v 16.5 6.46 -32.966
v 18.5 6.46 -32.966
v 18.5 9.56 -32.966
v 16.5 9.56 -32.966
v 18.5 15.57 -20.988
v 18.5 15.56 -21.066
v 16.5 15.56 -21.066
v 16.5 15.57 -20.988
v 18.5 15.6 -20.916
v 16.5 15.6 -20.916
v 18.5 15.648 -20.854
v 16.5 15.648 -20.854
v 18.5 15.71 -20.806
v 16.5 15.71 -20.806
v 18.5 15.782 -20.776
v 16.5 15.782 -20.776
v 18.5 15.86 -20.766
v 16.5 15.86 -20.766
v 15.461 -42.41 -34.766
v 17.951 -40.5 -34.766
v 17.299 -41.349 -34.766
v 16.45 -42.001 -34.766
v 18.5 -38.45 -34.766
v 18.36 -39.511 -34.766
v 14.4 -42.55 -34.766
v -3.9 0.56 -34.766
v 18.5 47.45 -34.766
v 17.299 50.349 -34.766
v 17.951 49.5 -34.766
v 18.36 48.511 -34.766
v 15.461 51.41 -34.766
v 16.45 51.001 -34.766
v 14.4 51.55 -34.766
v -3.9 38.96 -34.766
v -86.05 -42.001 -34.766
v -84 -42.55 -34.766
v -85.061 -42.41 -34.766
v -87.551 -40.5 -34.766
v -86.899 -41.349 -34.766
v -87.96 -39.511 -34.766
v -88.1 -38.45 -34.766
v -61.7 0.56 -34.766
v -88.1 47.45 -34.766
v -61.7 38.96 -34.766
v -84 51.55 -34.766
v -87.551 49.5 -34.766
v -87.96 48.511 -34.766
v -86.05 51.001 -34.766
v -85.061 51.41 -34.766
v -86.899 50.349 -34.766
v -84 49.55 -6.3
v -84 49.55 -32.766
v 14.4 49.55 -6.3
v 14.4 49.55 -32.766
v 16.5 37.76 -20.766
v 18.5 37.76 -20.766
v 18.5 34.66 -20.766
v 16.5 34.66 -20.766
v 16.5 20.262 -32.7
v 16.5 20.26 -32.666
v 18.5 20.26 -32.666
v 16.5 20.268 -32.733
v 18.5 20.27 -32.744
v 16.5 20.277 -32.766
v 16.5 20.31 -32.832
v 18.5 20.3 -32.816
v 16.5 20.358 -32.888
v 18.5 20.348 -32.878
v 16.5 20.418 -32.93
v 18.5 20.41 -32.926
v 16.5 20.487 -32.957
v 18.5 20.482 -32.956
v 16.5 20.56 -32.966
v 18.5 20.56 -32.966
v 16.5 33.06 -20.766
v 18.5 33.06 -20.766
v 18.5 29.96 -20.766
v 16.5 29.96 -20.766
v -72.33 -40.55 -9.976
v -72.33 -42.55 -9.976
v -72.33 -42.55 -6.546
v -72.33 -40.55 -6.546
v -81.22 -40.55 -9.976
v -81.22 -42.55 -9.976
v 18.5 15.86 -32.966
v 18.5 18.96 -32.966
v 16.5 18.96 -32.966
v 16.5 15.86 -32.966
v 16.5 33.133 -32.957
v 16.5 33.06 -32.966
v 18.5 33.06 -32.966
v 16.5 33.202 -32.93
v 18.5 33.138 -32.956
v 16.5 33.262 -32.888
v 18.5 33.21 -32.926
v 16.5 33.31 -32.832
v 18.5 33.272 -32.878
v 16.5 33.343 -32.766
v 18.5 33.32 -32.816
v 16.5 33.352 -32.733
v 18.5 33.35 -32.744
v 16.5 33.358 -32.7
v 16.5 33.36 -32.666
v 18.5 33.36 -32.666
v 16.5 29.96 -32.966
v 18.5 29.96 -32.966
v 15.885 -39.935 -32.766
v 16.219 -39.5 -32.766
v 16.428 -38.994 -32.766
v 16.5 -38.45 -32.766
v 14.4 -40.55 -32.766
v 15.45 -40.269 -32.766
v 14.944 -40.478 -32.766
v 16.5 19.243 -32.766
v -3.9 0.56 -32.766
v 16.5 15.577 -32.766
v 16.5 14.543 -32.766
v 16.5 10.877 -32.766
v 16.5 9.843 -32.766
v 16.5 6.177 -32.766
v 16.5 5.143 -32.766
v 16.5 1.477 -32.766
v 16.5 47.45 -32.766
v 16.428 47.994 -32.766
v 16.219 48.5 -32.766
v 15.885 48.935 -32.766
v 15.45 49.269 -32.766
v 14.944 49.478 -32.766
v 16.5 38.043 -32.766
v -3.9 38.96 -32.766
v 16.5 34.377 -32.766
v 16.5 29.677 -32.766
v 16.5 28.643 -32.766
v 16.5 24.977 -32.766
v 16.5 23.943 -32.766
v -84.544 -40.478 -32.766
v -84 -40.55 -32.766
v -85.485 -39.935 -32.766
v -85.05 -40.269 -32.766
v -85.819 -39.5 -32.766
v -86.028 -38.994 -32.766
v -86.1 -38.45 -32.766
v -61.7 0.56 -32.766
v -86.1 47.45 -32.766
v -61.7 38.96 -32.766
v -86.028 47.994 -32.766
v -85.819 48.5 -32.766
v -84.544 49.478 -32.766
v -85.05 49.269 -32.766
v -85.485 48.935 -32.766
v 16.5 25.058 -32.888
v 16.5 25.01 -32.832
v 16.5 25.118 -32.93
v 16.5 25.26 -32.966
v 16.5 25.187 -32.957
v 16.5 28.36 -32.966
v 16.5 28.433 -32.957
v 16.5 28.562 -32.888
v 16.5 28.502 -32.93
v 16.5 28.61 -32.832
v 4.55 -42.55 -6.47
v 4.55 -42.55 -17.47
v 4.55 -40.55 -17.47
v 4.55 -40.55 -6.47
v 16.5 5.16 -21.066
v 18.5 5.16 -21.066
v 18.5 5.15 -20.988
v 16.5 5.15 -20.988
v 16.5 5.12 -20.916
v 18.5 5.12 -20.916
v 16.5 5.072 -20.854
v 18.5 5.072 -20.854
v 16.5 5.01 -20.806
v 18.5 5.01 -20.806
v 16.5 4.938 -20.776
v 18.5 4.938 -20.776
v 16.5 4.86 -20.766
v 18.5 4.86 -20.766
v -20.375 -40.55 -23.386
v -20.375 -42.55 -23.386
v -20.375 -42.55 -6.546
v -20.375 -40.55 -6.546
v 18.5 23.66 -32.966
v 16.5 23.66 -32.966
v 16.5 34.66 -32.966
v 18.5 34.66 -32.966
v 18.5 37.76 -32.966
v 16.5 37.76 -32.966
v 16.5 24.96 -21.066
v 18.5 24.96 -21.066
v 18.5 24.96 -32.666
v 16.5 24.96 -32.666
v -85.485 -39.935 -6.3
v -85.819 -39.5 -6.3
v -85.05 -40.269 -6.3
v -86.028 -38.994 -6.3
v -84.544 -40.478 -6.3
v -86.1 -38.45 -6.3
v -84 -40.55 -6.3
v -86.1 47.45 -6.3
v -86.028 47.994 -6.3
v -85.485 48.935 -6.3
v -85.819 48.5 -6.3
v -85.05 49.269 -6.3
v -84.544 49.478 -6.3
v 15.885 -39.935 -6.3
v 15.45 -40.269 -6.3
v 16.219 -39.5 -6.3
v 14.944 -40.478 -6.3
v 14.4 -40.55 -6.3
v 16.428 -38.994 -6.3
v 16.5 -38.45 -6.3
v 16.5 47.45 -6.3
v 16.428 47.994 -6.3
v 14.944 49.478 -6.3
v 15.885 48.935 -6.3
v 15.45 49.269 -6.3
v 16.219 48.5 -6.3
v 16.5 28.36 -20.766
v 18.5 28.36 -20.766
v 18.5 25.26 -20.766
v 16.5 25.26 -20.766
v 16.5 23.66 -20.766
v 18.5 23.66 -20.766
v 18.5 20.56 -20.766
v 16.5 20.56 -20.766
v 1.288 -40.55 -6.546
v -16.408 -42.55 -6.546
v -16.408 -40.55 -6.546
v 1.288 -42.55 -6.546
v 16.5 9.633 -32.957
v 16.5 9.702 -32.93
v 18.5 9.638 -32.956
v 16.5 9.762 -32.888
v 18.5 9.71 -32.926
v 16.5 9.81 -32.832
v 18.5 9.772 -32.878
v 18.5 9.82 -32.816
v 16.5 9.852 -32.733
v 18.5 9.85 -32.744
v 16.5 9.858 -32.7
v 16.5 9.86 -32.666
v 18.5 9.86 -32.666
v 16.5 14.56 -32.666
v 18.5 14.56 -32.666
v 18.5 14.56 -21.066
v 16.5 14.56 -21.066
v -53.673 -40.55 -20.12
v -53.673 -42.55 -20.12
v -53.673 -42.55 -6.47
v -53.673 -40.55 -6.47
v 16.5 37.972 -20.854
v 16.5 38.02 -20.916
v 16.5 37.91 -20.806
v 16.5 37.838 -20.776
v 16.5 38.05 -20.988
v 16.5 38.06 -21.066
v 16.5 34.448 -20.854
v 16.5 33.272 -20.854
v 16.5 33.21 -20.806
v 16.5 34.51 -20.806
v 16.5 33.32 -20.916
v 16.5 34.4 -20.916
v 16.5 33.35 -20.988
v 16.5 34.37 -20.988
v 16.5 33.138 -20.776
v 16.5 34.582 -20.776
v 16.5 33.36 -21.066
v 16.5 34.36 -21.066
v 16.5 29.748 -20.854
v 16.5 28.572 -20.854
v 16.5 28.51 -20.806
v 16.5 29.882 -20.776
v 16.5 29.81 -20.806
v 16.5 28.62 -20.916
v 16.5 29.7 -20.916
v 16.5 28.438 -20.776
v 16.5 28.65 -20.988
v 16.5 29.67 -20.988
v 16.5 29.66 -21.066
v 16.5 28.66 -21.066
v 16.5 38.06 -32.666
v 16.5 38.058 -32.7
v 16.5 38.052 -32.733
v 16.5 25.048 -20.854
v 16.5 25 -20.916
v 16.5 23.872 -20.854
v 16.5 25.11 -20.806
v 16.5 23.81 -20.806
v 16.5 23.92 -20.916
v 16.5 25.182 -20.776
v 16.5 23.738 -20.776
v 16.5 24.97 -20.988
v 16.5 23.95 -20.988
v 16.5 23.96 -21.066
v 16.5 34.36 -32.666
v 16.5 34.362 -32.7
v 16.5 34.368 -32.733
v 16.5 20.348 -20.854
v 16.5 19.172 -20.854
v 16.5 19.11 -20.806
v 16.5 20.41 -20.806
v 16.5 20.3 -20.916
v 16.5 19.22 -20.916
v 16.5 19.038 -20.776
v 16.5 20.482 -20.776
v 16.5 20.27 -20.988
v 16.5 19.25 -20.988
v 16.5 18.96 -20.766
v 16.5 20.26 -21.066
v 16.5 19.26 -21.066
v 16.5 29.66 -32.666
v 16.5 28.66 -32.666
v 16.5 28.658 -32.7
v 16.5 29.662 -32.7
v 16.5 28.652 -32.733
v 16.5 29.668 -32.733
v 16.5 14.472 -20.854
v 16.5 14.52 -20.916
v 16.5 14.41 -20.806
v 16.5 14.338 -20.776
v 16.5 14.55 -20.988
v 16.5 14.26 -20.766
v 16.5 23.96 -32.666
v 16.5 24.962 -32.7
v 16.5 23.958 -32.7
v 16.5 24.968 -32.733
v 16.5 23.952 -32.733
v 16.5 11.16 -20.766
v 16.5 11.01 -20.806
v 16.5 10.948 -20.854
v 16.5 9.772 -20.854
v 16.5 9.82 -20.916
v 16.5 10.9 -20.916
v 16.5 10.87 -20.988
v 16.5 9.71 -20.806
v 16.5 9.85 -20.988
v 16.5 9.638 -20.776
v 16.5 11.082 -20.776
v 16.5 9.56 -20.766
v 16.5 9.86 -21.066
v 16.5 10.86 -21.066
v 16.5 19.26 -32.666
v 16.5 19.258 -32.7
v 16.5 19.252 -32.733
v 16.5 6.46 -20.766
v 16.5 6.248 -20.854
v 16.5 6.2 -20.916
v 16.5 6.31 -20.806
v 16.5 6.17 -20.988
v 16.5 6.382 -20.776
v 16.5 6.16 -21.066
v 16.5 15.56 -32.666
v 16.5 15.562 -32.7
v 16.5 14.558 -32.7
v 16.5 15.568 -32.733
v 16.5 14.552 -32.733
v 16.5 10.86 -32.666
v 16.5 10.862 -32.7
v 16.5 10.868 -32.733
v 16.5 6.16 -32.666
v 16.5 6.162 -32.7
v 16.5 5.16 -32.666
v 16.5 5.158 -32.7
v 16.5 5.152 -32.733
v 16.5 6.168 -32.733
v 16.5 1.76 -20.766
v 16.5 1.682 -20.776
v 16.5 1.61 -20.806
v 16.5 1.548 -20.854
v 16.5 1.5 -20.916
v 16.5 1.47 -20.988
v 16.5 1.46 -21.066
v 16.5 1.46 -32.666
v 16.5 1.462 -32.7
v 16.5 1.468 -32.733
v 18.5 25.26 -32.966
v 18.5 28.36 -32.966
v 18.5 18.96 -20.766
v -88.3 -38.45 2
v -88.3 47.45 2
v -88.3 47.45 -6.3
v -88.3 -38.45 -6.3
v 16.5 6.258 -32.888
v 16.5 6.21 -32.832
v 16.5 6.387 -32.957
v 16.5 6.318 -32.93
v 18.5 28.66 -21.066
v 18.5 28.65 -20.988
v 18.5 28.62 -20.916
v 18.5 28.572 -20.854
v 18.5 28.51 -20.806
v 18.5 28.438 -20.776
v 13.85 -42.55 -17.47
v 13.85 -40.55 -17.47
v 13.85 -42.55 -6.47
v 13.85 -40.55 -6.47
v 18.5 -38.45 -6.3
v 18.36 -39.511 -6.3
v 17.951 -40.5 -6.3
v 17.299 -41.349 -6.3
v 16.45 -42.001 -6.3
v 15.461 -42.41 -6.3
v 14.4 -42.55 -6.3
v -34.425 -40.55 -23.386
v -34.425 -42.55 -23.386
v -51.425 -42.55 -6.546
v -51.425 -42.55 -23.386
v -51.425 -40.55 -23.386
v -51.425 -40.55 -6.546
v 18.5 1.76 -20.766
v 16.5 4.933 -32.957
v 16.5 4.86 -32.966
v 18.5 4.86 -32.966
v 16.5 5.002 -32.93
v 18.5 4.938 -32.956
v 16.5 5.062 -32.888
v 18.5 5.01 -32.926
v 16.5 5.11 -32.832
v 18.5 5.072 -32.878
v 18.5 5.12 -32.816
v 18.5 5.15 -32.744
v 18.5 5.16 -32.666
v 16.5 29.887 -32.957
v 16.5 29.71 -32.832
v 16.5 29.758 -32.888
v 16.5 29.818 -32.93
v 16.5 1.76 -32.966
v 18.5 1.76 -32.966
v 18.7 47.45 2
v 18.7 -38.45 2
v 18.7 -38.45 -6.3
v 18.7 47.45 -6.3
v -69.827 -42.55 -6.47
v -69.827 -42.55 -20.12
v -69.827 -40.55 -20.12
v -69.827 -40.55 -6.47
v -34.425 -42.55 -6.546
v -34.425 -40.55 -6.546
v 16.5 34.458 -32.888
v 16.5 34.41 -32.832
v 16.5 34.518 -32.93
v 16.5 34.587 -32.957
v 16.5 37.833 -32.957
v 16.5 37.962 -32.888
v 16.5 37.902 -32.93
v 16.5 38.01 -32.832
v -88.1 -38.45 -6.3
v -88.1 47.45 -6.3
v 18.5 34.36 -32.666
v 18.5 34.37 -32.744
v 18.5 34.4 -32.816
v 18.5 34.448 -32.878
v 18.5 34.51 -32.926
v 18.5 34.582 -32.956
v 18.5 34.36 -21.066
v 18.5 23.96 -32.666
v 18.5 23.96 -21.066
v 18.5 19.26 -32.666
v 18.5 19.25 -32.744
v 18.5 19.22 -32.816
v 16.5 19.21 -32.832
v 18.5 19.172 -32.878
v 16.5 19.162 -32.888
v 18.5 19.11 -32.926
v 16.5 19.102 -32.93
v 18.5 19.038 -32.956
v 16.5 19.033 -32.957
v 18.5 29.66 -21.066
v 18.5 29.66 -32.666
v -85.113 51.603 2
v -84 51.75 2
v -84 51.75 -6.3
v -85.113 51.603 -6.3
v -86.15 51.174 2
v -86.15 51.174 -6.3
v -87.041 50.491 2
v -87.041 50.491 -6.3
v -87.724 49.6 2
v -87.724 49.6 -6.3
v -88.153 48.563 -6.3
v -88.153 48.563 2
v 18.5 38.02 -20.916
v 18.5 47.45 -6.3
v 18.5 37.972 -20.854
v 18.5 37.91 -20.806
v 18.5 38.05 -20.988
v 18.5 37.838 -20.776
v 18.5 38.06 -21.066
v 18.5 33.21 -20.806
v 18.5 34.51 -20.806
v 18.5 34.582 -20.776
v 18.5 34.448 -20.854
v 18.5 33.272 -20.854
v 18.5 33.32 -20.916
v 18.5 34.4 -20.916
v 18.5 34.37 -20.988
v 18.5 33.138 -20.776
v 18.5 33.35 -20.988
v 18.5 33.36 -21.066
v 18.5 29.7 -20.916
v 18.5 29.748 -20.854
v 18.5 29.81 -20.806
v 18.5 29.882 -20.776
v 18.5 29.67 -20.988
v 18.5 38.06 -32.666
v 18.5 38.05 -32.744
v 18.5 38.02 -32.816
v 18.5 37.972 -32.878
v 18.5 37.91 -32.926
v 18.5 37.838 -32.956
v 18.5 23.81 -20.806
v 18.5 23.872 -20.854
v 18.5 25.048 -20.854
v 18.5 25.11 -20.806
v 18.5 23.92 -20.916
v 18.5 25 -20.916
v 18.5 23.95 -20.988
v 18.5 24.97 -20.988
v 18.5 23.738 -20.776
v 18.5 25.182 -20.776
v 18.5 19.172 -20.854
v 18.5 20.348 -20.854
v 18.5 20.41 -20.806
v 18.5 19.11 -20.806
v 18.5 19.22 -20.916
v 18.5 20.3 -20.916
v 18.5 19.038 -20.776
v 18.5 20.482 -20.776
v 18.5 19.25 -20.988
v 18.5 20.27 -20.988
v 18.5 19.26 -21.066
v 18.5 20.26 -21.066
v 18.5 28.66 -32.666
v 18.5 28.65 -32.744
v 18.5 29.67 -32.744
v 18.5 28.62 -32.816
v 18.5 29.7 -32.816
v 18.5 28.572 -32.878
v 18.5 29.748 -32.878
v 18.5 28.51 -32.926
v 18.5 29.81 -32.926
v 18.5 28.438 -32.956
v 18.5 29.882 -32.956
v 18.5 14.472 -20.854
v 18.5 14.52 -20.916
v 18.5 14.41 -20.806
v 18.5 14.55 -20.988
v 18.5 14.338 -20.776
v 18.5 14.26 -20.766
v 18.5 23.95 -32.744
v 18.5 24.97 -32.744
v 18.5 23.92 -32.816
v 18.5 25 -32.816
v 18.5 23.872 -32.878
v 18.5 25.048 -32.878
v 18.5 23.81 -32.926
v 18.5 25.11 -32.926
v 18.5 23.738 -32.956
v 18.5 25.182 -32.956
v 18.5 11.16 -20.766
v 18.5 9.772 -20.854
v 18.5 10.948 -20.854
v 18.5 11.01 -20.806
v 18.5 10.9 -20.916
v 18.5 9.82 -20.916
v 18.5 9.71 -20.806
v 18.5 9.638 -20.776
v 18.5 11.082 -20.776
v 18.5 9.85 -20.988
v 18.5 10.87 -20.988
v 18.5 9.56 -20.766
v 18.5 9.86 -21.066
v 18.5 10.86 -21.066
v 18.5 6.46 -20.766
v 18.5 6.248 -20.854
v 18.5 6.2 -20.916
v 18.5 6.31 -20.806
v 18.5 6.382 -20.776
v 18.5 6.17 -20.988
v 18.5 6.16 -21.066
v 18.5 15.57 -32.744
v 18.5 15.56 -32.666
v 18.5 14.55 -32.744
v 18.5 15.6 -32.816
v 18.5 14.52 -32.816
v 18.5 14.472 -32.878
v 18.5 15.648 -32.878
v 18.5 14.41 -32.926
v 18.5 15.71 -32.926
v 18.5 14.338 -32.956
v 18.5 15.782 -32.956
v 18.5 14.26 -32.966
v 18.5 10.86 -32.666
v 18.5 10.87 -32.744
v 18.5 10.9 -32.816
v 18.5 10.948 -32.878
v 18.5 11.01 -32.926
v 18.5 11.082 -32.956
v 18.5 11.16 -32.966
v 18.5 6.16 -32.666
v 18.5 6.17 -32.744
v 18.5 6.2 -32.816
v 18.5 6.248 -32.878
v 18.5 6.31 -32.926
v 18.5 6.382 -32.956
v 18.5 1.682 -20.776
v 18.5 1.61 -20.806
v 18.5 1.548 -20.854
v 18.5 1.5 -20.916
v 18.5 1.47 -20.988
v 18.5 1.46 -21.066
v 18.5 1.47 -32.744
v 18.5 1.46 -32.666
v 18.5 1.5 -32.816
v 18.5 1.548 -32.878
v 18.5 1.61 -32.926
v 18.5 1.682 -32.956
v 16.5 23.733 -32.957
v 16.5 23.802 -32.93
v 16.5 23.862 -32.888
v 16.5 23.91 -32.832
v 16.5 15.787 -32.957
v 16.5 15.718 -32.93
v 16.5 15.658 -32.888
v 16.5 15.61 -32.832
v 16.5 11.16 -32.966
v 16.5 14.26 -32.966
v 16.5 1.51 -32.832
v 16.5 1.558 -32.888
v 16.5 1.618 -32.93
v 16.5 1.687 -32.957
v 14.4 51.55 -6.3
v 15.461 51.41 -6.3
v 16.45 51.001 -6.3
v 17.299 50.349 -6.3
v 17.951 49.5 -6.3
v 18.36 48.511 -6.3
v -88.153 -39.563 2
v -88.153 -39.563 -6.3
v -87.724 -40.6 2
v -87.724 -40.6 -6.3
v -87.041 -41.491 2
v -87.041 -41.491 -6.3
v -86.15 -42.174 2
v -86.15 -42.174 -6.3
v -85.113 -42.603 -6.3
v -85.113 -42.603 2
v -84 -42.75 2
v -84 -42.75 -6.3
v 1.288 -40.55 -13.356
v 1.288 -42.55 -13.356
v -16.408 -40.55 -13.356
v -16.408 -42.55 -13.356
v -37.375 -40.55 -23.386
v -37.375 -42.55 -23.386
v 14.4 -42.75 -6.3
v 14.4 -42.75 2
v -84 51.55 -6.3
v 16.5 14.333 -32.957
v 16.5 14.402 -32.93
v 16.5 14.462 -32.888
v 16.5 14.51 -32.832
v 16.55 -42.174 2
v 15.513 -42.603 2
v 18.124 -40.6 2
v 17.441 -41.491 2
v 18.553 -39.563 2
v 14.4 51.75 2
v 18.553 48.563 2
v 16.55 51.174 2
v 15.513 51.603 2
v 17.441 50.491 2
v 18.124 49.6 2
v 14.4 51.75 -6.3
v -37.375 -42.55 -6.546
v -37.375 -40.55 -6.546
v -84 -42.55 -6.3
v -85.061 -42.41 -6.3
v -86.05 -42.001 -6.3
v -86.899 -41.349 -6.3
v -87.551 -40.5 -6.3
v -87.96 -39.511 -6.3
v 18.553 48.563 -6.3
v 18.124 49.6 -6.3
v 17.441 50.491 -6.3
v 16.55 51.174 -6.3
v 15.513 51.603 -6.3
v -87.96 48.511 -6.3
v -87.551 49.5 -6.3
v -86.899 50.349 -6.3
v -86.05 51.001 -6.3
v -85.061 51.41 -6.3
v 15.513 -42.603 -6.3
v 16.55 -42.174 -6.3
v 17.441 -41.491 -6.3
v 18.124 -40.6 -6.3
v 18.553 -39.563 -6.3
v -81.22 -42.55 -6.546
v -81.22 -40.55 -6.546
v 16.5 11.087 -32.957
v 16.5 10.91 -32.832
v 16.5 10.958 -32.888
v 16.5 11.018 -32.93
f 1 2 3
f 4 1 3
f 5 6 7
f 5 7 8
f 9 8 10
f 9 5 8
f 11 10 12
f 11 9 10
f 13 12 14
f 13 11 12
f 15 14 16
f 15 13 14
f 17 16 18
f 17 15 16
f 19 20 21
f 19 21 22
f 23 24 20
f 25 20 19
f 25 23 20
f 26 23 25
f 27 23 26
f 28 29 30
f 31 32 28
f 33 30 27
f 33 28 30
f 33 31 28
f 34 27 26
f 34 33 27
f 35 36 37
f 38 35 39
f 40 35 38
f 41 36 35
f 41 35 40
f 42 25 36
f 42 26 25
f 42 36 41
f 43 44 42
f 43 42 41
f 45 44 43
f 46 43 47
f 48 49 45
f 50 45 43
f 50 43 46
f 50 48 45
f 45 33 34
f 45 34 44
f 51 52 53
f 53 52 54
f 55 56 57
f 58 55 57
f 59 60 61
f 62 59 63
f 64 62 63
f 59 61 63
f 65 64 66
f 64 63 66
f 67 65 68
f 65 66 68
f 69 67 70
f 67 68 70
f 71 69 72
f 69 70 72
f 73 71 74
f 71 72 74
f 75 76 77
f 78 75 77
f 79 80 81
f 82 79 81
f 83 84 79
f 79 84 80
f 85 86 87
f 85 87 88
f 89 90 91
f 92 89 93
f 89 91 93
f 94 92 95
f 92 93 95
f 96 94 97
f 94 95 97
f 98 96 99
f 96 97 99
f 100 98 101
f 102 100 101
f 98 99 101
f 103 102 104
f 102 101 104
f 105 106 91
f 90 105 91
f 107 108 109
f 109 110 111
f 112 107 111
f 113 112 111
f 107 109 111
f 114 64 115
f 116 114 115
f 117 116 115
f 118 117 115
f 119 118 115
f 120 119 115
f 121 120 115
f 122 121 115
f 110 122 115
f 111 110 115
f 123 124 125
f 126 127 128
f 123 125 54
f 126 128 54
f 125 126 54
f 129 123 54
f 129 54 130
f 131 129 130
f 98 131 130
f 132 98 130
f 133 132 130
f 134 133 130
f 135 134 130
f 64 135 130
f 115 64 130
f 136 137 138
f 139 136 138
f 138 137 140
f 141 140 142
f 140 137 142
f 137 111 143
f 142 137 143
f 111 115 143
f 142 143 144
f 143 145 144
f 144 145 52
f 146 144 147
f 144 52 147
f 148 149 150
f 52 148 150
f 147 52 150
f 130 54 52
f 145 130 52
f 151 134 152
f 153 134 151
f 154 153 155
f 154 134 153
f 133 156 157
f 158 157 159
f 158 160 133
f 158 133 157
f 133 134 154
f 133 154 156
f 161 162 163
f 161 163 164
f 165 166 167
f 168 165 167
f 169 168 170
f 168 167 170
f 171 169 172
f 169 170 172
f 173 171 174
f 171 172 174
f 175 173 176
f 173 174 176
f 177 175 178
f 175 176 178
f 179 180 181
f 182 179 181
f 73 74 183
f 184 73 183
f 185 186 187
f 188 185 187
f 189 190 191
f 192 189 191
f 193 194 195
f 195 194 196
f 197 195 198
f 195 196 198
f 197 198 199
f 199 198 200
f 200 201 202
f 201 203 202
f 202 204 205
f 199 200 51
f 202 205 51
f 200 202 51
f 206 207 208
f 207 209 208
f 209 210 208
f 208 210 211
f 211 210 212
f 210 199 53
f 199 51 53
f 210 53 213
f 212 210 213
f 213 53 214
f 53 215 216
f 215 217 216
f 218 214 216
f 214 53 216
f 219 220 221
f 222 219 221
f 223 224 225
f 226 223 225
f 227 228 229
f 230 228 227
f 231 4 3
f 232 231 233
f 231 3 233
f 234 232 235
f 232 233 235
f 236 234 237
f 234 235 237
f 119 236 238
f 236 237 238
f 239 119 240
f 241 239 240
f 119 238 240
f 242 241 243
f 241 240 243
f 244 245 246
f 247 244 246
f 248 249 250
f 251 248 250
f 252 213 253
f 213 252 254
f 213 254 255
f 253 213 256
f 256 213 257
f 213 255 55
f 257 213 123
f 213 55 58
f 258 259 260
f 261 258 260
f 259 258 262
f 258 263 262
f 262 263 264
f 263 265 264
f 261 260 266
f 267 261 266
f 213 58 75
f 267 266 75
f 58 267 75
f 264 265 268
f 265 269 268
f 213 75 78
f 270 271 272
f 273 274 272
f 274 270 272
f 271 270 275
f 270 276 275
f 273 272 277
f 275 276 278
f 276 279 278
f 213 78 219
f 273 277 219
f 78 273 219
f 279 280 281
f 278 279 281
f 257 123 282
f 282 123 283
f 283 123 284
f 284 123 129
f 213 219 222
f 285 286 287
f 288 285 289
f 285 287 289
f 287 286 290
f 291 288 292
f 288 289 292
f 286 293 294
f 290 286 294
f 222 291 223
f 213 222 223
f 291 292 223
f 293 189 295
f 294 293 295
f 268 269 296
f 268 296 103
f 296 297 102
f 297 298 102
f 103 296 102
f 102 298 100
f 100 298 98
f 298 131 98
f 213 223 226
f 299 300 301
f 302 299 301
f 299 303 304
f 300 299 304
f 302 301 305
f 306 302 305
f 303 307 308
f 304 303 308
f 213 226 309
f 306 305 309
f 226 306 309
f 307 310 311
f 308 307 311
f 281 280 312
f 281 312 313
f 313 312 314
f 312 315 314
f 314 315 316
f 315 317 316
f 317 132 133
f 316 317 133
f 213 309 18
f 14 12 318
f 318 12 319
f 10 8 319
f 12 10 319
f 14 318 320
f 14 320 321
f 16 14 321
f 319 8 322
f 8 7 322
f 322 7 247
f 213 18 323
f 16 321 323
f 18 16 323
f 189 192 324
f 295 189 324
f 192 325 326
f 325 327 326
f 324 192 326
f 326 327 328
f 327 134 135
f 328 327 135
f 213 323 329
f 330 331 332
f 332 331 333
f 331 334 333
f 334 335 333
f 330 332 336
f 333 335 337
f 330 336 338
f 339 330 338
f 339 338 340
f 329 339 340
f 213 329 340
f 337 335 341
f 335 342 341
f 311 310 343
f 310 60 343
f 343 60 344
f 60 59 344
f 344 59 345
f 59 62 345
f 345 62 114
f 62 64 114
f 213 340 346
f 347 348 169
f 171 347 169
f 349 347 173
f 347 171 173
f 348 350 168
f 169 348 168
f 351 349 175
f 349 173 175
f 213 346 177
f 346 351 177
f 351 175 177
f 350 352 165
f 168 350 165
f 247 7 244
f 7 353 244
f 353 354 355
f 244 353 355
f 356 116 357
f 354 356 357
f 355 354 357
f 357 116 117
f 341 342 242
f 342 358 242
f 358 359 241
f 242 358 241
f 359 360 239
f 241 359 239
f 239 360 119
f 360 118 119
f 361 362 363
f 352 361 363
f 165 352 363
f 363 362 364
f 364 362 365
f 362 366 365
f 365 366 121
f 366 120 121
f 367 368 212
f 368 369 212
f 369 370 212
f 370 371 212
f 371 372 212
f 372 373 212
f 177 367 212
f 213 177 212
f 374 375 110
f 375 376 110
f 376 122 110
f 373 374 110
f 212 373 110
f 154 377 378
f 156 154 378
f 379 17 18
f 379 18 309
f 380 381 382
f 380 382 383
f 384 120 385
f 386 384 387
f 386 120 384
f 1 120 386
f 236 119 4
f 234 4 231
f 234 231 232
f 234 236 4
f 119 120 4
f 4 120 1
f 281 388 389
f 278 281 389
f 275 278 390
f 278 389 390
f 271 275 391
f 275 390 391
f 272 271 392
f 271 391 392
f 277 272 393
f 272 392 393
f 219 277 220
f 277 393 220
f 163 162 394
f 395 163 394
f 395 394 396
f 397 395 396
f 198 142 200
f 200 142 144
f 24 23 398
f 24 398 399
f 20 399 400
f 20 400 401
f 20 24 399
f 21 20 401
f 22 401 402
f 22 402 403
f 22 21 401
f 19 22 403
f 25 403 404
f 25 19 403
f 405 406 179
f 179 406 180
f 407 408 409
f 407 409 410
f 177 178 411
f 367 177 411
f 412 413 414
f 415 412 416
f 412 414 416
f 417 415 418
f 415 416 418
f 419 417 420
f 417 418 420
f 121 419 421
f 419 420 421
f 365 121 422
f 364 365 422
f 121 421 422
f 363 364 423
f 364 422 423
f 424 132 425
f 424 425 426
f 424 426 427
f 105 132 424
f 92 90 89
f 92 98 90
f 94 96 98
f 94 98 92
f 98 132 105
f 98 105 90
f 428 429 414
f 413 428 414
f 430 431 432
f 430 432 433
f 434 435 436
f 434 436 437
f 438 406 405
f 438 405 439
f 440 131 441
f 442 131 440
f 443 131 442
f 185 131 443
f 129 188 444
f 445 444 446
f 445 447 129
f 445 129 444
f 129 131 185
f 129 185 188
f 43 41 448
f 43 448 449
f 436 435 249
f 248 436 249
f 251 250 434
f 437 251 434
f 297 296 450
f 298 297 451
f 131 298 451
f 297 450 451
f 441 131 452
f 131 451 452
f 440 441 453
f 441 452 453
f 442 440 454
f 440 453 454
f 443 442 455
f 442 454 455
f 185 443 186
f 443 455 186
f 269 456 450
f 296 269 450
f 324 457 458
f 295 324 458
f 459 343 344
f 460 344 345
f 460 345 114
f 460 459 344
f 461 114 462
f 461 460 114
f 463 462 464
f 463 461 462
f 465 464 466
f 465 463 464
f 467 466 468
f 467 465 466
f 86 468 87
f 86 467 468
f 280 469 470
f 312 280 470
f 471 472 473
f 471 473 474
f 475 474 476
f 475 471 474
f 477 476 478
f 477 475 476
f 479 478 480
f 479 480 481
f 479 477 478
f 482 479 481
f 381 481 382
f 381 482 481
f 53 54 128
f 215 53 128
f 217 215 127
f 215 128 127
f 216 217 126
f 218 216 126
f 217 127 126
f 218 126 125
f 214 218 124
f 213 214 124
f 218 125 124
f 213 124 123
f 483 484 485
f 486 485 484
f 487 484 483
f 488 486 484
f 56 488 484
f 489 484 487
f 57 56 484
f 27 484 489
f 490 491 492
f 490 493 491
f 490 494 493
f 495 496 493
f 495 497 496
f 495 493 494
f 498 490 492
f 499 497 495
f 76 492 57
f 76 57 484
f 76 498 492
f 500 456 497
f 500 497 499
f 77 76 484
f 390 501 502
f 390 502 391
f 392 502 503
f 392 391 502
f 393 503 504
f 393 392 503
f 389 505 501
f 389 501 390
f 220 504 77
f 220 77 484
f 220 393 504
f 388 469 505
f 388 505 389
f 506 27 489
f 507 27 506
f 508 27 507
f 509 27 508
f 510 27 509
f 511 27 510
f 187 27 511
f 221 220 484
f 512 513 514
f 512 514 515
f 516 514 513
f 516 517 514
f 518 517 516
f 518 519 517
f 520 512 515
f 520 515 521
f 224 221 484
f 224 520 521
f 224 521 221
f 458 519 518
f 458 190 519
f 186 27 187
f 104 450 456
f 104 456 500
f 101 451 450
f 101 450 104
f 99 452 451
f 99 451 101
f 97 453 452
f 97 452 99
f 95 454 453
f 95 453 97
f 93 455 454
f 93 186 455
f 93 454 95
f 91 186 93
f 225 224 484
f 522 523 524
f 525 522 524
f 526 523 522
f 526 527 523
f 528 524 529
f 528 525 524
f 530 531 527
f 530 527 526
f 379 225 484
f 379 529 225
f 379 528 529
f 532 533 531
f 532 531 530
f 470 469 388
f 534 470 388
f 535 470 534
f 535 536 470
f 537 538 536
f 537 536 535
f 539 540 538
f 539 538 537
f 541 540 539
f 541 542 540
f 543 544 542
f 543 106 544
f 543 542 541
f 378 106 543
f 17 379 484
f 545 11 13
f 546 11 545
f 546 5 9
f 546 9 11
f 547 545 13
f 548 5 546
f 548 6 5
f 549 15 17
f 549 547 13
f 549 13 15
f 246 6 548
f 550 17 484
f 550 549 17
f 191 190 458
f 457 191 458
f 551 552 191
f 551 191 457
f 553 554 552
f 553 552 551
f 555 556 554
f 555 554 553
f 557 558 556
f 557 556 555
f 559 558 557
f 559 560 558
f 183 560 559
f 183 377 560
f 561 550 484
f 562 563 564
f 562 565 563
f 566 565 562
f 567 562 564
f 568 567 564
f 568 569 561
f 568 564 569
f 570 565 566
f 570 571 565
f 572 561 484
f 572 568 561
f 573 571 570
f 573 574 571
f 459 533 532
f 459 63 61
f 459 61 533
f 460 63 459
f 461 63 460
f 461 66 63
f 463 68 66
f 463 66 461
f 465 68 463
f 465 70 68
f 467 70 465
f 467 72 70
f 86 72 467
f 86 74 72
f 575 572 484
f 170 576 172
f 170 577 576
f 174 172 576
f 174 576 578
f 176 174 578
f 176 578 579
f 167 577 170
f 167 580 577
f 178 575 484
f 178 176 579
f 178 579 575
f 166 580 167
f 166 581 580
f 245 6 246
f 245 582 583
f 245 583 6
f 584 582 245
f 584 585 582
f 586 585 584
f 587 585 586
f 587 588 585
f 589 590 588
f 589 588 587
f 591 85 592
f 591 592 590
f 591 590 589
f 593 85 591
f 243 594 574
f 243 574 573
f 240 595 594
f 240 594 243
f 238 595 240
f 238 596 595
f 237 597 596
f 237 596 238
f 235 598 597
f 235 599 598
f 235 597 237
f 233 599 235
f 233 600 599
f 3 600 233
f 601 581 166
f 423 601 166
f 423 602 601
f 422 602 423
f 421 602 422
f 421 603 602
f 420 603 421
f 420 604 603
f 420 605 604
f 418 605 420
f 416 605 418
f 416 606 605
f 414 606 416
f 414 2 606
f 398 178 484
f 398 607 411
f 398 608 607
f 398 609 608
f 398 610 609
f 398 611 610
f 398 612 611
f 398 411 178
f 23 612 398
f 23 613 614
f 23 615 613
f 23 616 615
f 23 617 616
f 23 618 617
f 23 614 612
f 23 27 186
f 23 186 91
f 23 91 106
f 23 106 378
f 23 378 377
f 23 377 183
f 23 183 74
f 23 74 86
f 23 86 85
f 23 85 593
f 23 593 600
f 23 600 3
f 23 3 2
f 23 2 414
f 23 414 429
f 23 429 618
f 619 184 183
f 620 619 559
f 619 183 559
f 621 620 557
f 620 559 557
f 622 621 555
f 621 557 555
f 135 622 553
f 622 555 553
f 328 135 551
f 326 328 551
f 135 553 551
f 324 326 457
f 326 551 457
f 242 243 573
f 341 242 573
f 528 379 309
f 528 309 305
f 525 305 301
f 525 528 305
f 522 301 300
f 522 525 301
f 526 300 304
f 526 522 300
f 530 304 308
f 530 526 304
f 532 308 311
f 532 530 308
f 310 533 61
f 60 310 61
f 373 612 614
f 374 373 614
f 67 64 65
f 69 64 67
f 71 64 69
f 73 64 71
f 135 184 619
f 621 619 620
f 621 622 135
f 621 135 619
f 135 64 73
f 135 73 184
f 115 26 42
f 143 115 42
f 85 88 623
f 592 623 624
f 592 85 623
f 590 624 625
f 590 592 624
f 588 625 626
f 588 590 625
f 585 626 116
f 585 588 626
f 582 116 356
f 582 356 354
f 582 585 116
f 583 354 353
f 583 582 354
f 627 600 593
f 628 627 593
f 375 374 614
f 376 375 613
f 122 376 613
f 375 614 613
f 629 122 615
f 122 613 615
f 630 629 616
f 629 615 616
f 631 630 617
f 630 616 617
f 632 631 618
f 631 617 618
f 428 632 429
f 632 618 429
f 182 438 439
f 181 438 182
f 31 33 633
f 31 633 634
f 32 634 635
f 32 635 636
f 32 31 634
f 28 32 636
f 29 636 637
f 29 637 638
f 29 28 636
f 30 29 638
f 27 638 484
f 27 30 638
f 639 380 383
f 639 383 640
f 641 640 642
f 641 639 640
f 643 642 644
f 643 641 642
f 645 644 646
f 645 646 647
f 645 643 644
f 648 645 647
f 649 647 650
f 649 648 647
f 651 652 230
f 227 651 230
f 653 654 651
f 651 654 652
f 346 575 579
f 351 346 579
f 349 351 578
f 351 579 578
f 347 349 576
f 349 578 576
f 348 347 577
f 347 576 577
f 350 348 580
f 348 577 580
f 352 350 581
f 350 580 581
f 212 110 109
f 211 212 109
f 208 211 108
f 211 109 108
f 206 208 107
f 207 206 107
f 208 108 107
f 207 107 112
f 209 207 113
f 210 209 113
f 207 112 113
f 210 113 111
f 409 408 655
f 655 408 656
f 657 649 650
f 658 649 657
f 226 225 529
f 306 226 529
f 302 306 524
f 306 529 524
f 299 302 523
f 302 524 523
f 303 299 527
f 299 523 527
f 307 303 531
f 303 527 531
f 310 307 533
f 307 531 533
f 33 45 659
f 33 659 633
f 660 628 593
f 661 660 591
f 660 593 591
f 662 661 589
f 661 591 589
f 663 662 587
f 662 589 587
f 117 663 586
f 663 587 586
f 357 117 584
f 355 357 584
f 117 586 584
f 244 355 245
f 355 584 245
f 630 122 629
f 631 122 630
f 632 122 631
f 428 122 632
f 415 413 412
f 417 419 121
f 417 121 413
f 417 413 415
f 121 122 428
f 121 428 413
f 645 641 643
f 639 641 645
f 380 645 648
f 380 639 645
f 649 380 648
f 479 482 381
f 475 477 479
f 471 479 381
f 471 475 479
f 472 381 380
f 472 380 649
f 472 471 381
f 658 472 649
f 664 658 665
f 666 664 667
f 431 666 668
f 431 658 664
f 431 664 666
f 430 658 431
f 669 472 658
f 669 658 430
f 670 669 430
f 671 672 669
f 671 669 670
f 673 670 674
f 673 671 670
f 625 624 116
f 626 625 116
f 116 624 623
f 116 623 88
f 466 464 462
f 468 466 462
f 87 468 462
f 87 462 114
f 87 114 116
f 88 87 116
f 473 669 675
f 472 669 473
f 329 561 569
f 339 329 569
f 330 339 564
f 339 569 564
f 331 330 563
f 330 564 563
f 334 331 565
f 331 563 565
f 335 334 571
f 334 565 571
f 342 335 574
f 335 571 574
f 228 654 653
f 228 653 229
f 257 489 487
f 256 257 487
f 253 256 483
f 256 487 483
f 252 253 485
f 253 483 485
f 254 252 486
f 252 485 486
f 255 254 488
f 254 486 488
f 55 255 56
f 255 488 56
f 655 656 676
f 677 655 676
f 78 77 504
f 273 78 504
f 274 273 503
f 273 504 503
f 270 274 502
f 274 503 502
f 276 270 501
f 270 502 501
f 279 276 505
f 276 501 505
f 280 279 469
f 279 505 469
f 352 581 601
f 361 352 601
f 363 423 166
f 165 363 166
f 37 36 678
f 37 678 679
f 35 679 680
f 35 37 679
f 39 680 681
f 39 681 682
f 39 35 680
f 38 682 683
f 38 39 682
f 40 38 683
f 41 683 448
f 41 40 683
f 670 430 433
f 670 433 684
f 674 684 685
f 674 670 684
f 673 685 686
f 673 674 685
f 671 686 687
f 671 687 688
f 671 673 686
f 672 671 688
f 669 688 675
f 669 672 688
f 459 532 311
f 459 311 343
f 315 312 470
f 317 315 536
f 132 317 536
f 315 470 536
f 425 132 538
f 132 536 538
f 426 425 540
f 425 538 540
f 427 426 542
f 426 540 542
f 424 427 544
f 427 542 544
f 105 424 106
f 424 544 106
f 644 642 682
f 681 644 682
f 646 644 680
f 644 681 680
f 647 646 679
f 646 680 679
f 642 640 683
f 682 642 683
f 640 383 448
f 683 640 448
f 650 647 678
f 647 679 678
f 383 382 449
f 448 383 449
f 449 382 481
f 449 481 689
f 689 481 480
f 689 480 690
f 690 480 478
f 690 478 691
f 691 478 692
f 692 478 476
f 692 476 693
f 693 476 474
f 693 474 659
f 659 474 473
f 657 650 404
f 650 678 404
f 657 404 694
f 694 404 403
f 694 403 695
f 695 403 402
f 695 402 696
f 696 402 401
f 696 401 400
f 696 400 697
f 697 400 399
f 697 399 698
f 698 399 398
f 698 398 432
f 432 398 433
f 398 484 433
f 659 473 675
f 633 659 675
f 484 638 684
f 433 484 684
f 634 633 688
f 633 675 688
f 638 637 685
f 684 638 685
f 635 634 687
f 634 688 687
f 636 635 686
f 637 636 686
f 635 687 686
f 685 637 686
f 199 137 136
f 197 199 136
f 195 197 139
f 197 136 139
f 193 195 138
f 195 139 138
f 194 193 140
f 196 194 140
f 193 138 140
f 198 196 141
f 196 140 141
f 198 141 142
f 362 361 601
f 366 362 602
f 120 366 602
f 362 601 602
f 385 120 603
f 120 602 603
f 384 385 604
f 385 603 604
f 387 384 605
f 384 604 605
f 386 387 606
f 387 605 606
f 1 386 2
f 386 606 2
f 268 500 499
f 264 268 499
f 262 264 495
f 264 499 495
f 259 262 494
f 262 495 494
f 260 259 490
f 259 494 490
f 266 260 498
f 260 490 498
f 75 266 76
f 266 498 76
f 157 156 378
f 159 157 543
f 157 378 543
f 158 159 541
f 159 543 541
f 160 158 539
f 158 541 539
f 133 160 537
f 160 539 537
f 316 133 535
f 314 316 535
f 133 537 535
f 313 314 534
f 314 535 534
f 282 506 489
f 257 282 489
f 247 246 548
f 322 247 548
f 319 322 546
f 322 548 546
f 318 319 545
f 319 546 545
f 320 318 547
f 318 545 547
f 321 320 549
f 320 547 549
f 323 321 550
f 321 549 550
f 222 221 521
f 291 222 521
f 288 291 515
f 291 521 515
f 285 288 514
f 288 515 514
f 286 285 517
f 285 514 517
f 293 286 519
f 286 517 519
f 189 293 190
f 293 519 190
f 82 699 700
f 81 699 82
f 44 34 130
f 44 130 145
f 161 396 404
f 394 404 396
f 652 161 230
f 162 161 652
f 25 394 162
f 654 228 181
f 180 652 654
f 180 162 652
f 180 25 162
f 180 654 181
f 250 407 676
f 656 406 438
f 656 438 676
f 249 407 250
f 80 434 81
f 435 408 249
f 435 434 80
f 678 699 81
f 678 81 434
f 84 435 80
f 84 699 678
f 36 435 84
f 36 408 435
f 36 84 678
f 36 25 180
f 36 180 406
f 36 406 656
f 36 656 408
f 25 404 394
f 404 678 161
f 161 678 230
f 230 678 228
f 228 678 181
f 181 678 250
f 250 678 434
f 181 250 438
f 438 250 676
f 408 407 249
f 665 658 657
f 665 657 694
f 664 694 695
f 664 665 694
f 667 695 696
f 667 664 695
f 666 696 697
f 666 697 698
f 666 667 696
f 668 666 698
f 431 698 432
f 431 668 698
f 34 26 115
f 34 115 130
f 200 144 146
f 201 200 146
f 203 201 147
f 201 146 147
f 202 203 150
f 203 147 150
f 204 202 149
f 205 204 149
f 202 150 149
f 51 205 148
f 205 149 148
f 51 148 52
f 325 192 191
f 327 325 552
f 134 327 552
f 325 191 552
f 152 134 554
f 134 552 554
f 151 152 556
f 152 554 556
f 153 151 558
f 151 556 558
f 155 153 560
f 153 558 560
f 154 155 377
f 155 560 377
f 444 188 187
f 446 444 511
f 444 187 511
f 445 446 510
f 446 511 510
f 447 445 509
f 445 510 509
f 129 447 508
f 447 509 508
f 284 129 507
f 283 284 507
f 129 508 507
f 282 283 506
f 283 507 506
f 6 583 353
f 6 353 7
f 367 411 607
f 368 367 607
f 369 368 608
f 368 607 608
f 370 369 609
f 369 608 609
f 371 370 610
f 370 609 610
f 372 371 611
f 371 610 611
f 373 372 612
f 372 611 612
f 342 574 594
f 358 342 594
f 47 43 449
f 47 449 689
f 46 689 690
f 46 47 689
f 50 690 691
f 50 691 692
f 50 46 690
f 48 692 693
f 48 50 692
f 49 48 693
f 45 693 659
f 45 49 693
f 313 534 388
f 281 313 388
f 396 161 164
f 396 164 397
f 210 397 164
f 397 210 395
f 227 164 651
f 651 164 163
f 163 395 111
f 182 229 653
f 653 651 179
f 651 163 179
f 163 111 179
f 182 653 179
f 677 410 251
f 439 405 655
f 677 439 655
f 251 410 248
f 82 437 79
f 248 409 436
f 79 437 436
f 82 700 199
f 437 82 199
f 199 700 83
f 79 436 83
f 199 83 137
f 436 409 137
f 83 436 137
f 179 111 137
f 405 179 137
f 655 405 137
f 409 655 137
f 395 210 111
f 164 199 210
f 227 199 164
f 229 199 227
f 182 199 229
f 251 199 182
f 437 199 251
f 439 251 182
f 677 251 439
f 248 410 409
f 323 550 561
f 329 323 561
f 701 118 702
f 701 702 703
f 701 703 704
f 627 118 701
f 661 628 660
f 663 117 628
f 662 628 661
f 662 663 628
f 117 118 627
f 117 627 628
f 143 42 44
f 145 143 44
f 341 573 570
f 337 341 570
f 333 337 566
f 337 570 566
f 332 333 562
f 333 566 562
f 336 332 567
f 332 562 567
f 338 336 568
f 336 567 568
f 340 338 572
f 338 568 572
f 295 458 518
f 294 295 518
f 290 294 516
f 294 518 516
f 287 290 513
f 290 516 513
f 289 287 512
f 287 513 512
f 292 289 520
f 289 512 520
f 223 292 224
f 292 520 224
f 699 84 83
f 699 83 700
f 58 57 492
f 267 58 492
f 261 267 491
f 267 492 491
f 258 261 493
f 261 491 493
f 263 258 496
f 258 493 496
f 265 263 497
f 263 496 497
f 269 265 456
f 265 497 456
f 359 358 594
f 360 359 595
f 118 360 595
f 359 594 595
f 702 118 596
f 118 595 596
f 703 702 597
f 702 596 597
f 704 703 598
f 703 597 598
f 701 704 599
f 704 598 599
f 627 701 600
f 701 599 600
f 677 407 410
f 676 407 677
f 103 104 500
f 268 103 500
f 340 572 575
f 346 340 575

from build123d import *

# Parameters (mm, degrees)
BOSS_EXTRUDE1_DEPTH = 2
BOSS_EXTRUDE2_DEPTH = 8.3
SKETCH3_W           = 57.8
SKETCH3_H           = 38.4
BOSS_EXTRUDE3_DEPTH = 2
BOSS_EXTRUDE6_DEPTH = 30
SKETCH5_W           = 9.3
SKETCH5_H           = 11
SKETCH5_W_2         = 17.696
SKETCH5_H_2         = 6.81
SKETCH5_W_3         = 14.05
SKETCH5_H_3         = 16.84
SKETCH5_W_4         = 8.89
SKETCH5_H_4         = 3.43
SKETCH5_W_5         = 8.74
SKETCH5_H_5         = 13.649992795
SKETCH5_W_6         = 2
SKETCH5_W_7         = 1.707
CUT_EXTRUDE1_DEPTH  = 2
CUT_EXTRUDE2_DEPTH  = 2
CUT_EXTRUDE3_DEPTH  = 2
CUT_EXTRUDE4_DEPTH  = 2


with BuildPart() as part:
    # Sketch1 → Boss-Extrude1 (new body)
    with BuildSketch(Plane.XY):
        with BuildLine():
            Line((-86.3, 47.45), (-86.3, -38.45))
            ThreePointArc((-86.3, -38.45), (-85.626345597, -40.076345597), (-84, -40.75))
            Line((-84, -40.75), (14.4, -40.75))
            ThreePointArc((14.4, -40.75), (16.026345597, -40.076345597), (16.7, -38.45))
            Line((16.7, -38.45), (16.7, 47.45))
            ThreePointArc((16.7, 47.45), (16.026345597, 49.076345597), (14.4, 49.75))
            Line((14.4, 49.75), (-84, 49.75))
            ThreePointArc((-84, 49.75), (-85.626345597, 49.076345597), (-86.3, 47.45))
        make_face()
    extrude(amount=BOSS_EXTRUDE1_DEPTH)

    # Sketch2 → Boss-Extrude2 (add)
    with BuildSketch(Plane.XY.offset(2)):
        with BuildLine():
            Line((-88.3, 47.45), (-88.3, -38.45))
            ThreePointArc((-88.3, -38.45), (-87.040559159, -41.490559159), (-84, -42.75))
            Line((-84, -42.75), (14.4, -42.75))
            ThreePointArc((14.4, -42.75), (17.440559159, -41.490559159), (18.7, -38.45))
            Line((18.7, -38.45), (18.7, 47.45))
            ThreePointArc((18.7, 47.45), (17.440559159, 50.490559159), (14.4, 51.75))
            Line((14.4, 51.75), (-84, 51.75))
            ThreePointArc((-84, 51.75), (-87.040559159, 50.490559159), (-88.3, 47.45))
        make_face()
    extrude(amount=-BOSS_EXTRUDE2_DEPTH)



with BuildPart() as body_2:
    # Sketch3 → Boss-Extrude3 (new body)
    with BuildSketch(Plane(origin=(0, 0, -34.766), x_dir=(-1, 0, 0), z_dir=(0, 0, -1))):
        with BuildLine():
            Line((-14.4, -40.55), (84, -40.55))
            ThreePointArc((84, -40.55), (85.48492424, -39.93492424), (86.1, -38.45))
            Line((86.1, -38.45), (86.1, 47.45))
            ThreePointArc((86.1, 47.45), (85.48492424, 48.93492424), (84, 49.55))
            Line((84, 49.55), (-14.4, 49.55))
            ThreePointArc((-14.4, 49.55), (-15.88492424, 48.93492424), (-16.5, 47.45))
            Line((-16.5, 47.45), (-16.5, -38.45))
            ThreePointArc((-16.5, -38.45), (-15.88492424, -39.93492424), (-14.4, -40.55))
        make_face()
        with Locations((32.8, 19.76)):
            Rectangle(SKETCH3_W, SKETCH3_H, mode=Mode.SUBTRACT)
    extrude(amount=-BOSS_EXTRUDE3_DEPTH)


with BuildPart() as part_1:
    add(part.part)

    add(body_2.part)  # Boss-Extrude6 merges body 2
    # Sketch4 → Boss-Extrude6 (add)
    with BuildSketch(Plane(origin=(0, 0, -34.766), x_dir=(-1, 0, 0), z_dir=(0, 0, -1))):
        with BuildLine():
            Line((84, 51.55), (-14.4, 51.55))
            ThreePointArc((-14.4, 51.55), (-17.299137803, 50.349137803), (-18.5, 47.45))
            Line((-18.5, 47.45), (-18.5, -38.45))
            ThreePointArc((-18.5, -38.45), (-17.299137803, -41.349137803), (-14.4, -42.55))
            Line((-14.4, -42.55), (84, -42.55))
            ThreePointArc((84, -42.55), (86.899137803, -41.349137803), (88.1, -38.45))
            Line((88.1, -38.45), (88.1, 47.45))
            ThreePointArc((88.1, 47.45), (86.899137803, 50.349137803), (84, 51.55))
        make_face()
        with BuildLine():
            ThreePointArc((-16.5, -38.45), (-15.88492424, -39.93492424), (-14.4, -40.55))
            Line((-14.4, -40.55), (84, -40.55))
            ThreePointArc((84, -40.55), (85.48492424, -39.93492424), (86.1, -38.45))
            Line((86.1, -38.45), (86.1, 47.45))
            ThreePointArc((86.1, 47.45), (85.48492424, 48.93492424), (84, 49.55))
            Line((84, 49.55), (-14.4, 49.55))
            ThreePointArc((-14.4, 49.55), (-15.88492424, 48.93492424), (-16.5, 47.45))
            Line((-16.5, 47.45), (-16.5, -38.45))
        make_face(mode=Mode.SUBTRACT)
    extrude(amount=-BOSS_EXTRUDE6_DEPTH)

    # Sketch5 → Cut-Extrude1 (cut)
    with BuildSketch(Plane.XZ.offset(42.55)):
        with Locations((9.2, -11.97)):
            Rectangle(SKETCH5_W, SKETCH5_H)
        with Locations((-7.56, -9.9512)):
            Rectangle(SKETCH5_W_2, SKETCH5_H_2)
        with Locations((-27.4, -14.9662)):
            Rectangle(SKETCH5_W_3, SKETCH5_H_3)
        with Locations((-44.4, -14.9662)):
            Rectangle(SKETCH5_W_3, SKETCH5_H_3)
        with Locations((-76.775, -8.2612)):
            Rectangle(SKETCH5_W_4, SKETCH5_H_4)
        with Locations((-61.75, -13.294996398)):
            Rectangle(SKETCH5_W_5, SKETCH5_H_5)
        with Locations((-56.38, -13.294996398)):
            Rectangle(SKETCH5_W_6, SKETCH5_H_5)
        with Locations((-67.12, -13.294996398)):
            Rectangle(SKETCH5_W_6, SKETCH5_H_5)
        with Locations((-54.5265, -13.294996398)):
            Rectangle(SKETCH5_W_7, SKETCH5_H_5)
        with Locations((-68.9735, -13.294996398)):
            Rectangle(SKETCH5_W_7, SKETCH5_H_5)
    extrude(amount=-CUT_EXTRUDE1_DEPTH, mode=Mode.SUBTRACT)

    # Sketch6 → Cut-Extrude2 (cut)
    with BuildSketch(Plane(origin=(18.5, 0, 0), x_dir=(0, 0, -1), z_dir=(1, 0, 0))):
        with BuildLine():
            Line((32.966, 1.76), (32.966, 4.86))
            ThreePointArc((32.966, 4.86), (32.878132034, 5.072132034), (32.666, 5.16))
            Line((32.666, 5.16), (21.066, 5.16))
            ThreePointArc((21.066, 5.16), (20.853867966, 5.072132034), (20.766, 4.86))
            Line((20.766, 4.86), (20.766, 1.76))
            ThreePointArc((20.766, 1.76), (20.853867966, 1.547867966), (21.066, 1.46))
            Line((21.066, 1.46), (32.666, 1.46))
            ThreePointArc((32.666, 1.46), (32.878132034, 1.547867966), (32.966, 1.76))
        make_face()
    extrude(amount=-CUT_EXTRUDE2_DEPTH, mode=Mode.SUBTRACT)

    # Sketch7 → Cut-Extrude3 (cut)
    with BuildSketch(Plane(origin=(18.5, 0, 0), x_dir=(0, 0, -1), z_dir=(1, 0, 0))):
        with BuildLine():
            Line((20.766, 28.36), (20.766, 25.26))
            ThreePointArc((20.766, 25.26), (20.853867966, 25.047867966), (21.066, 24.96))
            Line((21.066, 24.96), (32.666, 24.96))
            ThreePointArc((32.666, 24.96), (32.878132034, 25.047867966), (32.966, 25.26))
            Line((32.966, 25.26), (32.966, 28.36))
            ThreePointArc((32.966, 28.36), (32.878132034, 28.572132034), (32.666, 28.66))
            Line((32.666, 28.66), (21.066, 28.66))
            ThreePointArc((21.066, 28.66), (20.853867966, 28.572132034), (20.766, 28.36))
        make_face()
        with BuildLine():
            Line((32.666, 23.96), (21.066, 23.96))
            ThreePointArc((21.066, 23.96), (20.853867966, 23.872132034), (20.766, 23.66))
            Line((20.766, 23.66), (20.766, 20.56))
            ThreePointArc((20.766, 20.56), (20.853867966, 20.347867966), (21.066, 20.26))
            Line((21.066, 20.26), (32.666, 20.26))
            ThreePointArc((32.666, 20.26), (32.878132034, 20.347867966), (32.966, 20.56))
            Line((32.966, 20.56), (32.966, 23.66))
            ThreePointArc((32.966, 23.66), (32.878132034, 23.872132034), (32.666, 23.96))
        make_face()
        with BuildLine():
            Line((32.666, 15.56), (21.066, 15.56))
            ThreePointArc((21.066, 15.56), (20.853867966, 15.647867966), (20.766, 15.86))
            Line((20.766, 15.86), (20.766, 18.96))
            ThreePointArc((20.766, 18.96), (20.853867966, 19.172132034), (21.066, 19.26))
            Line((21.066, 19.26), (32.666, 19.26))
            ThreePointArc((32.666, 19.26), (32.878132034, 19.172132034), (32.966, 18.96))
            Line((32.966, 18.96), (32.966, 15.86))
            ThreePointArc((32.966, 15.86), (32.878132034, 15.647867966), (32.666, 15.56))
        make_face()
        with BuildLine():
            Line((32.666, 14.56), (21.066, 14.56))
            ThreePointArc((21.066, 14.56), (20.853867966, 14.472132034), (20.766, 14.26))
            Line((20.766, 14.26), (20.766, 11.16))
            ThreePointArc((20.766, 11.16), (20.853867966, 10.947867966), (21.066, 10.86))
            Line((21.066, 10.86), (32.666, 10.86))
            ThreePointArc((32.666, 10.86), (32.878132034, 10.947867966), (32.966, 11.16))
            Line((32.966, 11.16), (32.966, 14.26))
            ThreePointArc((32.966, 14.26), (32.878132034, 14.472132034), (32.666, 14.56))
        make_face()
        with BuildLine():
            Line((20.766, 9.56), (20.766, 6.46))
            ThreePointArc((20.766, 6.46), (20.853867966, 6.247867966), (21.066, 6.16))
            Line((21.066, 6.16), (32.666, 6.16))
            ThreePointArc((32.666, 6.16), (32.878132034, 6.247867966), (32.966, 6.46))
            Line((32.966, 6.46), (32.966, 9.56))
            ThreePointArc((32.966, 9.56), (32.878132034, 9.772132034), (32.666, 9.86))
            Line((32.666, 9.86), (21.066, 9.86))
            ThreePointArc((21.066, 9.86), (20.853867966, 9.772132034), (20.766, 9.56))
        make_face()
    extrude(amount=-CUT_EXTRUDE3_DEPTH, mode=Mode.SUBTRACT)

    # Sketch10 → Cut-Extrude4 (cut)
    with BuildSketch(Plane(origin=(18.5, 0, 0), x_dir=(0, 0, -1), z_dir=(1, 0, 0))):
        with BuildLine():
            Line((32.966, 34.66), (32.966, 37.76))
            ThreePointArc((32.966, 37.76), (32.878132034, 37.972132034), (32.666, 38.06))
            Line((32.666, 38.06), (21.066, 38.06))
            ThreePointArc((21.066, 38.06), (20.853867966, 37.972132034), (20.766, 37.76))
            Line((20.766, 37.76), (20.766, 34.66))
            ThreePointArc((20.766, 34.66), (20.853867966, 34.447867966), (21.066, 34.36))
            Line((21.066, 34.36), (32.666, 34.36))
            ThreePointArc((32.666, 34.36), (32.878132034, 34.447867966), (32.966, 34.66))
        make_face()
        with BuildLine():
            Line((20.766, 33.06), (20.766, 29.96))
            ThreePointArc((20.766, 29.96), (20.853867966, 29.747867966), (21.066, 29.66))
            Line((21.066, 29.66), (32.666, 29.66))
            ThreePointArc((32.666, 29.66), (32.878132034, 29.747867966), (32.966, 29.96))
            Line((32.966, 29.96), (32.966, 33.06))
            ThreePointArc((32.966, 33.06), (32.878132034, 33.272132034), (32.666, 33.36))
            Line((32.666, 33.36), (21.066, 33.36))
            ThreePointArc((21.066, 33.36), (20.853867966, 33.272132034), (20.766, 33.06))
        make_face()
    extrude(amount=-CUT_EXTRUDE4_DEPTH, mode=Mode.SUBTRACT)


solid = part_1.part
